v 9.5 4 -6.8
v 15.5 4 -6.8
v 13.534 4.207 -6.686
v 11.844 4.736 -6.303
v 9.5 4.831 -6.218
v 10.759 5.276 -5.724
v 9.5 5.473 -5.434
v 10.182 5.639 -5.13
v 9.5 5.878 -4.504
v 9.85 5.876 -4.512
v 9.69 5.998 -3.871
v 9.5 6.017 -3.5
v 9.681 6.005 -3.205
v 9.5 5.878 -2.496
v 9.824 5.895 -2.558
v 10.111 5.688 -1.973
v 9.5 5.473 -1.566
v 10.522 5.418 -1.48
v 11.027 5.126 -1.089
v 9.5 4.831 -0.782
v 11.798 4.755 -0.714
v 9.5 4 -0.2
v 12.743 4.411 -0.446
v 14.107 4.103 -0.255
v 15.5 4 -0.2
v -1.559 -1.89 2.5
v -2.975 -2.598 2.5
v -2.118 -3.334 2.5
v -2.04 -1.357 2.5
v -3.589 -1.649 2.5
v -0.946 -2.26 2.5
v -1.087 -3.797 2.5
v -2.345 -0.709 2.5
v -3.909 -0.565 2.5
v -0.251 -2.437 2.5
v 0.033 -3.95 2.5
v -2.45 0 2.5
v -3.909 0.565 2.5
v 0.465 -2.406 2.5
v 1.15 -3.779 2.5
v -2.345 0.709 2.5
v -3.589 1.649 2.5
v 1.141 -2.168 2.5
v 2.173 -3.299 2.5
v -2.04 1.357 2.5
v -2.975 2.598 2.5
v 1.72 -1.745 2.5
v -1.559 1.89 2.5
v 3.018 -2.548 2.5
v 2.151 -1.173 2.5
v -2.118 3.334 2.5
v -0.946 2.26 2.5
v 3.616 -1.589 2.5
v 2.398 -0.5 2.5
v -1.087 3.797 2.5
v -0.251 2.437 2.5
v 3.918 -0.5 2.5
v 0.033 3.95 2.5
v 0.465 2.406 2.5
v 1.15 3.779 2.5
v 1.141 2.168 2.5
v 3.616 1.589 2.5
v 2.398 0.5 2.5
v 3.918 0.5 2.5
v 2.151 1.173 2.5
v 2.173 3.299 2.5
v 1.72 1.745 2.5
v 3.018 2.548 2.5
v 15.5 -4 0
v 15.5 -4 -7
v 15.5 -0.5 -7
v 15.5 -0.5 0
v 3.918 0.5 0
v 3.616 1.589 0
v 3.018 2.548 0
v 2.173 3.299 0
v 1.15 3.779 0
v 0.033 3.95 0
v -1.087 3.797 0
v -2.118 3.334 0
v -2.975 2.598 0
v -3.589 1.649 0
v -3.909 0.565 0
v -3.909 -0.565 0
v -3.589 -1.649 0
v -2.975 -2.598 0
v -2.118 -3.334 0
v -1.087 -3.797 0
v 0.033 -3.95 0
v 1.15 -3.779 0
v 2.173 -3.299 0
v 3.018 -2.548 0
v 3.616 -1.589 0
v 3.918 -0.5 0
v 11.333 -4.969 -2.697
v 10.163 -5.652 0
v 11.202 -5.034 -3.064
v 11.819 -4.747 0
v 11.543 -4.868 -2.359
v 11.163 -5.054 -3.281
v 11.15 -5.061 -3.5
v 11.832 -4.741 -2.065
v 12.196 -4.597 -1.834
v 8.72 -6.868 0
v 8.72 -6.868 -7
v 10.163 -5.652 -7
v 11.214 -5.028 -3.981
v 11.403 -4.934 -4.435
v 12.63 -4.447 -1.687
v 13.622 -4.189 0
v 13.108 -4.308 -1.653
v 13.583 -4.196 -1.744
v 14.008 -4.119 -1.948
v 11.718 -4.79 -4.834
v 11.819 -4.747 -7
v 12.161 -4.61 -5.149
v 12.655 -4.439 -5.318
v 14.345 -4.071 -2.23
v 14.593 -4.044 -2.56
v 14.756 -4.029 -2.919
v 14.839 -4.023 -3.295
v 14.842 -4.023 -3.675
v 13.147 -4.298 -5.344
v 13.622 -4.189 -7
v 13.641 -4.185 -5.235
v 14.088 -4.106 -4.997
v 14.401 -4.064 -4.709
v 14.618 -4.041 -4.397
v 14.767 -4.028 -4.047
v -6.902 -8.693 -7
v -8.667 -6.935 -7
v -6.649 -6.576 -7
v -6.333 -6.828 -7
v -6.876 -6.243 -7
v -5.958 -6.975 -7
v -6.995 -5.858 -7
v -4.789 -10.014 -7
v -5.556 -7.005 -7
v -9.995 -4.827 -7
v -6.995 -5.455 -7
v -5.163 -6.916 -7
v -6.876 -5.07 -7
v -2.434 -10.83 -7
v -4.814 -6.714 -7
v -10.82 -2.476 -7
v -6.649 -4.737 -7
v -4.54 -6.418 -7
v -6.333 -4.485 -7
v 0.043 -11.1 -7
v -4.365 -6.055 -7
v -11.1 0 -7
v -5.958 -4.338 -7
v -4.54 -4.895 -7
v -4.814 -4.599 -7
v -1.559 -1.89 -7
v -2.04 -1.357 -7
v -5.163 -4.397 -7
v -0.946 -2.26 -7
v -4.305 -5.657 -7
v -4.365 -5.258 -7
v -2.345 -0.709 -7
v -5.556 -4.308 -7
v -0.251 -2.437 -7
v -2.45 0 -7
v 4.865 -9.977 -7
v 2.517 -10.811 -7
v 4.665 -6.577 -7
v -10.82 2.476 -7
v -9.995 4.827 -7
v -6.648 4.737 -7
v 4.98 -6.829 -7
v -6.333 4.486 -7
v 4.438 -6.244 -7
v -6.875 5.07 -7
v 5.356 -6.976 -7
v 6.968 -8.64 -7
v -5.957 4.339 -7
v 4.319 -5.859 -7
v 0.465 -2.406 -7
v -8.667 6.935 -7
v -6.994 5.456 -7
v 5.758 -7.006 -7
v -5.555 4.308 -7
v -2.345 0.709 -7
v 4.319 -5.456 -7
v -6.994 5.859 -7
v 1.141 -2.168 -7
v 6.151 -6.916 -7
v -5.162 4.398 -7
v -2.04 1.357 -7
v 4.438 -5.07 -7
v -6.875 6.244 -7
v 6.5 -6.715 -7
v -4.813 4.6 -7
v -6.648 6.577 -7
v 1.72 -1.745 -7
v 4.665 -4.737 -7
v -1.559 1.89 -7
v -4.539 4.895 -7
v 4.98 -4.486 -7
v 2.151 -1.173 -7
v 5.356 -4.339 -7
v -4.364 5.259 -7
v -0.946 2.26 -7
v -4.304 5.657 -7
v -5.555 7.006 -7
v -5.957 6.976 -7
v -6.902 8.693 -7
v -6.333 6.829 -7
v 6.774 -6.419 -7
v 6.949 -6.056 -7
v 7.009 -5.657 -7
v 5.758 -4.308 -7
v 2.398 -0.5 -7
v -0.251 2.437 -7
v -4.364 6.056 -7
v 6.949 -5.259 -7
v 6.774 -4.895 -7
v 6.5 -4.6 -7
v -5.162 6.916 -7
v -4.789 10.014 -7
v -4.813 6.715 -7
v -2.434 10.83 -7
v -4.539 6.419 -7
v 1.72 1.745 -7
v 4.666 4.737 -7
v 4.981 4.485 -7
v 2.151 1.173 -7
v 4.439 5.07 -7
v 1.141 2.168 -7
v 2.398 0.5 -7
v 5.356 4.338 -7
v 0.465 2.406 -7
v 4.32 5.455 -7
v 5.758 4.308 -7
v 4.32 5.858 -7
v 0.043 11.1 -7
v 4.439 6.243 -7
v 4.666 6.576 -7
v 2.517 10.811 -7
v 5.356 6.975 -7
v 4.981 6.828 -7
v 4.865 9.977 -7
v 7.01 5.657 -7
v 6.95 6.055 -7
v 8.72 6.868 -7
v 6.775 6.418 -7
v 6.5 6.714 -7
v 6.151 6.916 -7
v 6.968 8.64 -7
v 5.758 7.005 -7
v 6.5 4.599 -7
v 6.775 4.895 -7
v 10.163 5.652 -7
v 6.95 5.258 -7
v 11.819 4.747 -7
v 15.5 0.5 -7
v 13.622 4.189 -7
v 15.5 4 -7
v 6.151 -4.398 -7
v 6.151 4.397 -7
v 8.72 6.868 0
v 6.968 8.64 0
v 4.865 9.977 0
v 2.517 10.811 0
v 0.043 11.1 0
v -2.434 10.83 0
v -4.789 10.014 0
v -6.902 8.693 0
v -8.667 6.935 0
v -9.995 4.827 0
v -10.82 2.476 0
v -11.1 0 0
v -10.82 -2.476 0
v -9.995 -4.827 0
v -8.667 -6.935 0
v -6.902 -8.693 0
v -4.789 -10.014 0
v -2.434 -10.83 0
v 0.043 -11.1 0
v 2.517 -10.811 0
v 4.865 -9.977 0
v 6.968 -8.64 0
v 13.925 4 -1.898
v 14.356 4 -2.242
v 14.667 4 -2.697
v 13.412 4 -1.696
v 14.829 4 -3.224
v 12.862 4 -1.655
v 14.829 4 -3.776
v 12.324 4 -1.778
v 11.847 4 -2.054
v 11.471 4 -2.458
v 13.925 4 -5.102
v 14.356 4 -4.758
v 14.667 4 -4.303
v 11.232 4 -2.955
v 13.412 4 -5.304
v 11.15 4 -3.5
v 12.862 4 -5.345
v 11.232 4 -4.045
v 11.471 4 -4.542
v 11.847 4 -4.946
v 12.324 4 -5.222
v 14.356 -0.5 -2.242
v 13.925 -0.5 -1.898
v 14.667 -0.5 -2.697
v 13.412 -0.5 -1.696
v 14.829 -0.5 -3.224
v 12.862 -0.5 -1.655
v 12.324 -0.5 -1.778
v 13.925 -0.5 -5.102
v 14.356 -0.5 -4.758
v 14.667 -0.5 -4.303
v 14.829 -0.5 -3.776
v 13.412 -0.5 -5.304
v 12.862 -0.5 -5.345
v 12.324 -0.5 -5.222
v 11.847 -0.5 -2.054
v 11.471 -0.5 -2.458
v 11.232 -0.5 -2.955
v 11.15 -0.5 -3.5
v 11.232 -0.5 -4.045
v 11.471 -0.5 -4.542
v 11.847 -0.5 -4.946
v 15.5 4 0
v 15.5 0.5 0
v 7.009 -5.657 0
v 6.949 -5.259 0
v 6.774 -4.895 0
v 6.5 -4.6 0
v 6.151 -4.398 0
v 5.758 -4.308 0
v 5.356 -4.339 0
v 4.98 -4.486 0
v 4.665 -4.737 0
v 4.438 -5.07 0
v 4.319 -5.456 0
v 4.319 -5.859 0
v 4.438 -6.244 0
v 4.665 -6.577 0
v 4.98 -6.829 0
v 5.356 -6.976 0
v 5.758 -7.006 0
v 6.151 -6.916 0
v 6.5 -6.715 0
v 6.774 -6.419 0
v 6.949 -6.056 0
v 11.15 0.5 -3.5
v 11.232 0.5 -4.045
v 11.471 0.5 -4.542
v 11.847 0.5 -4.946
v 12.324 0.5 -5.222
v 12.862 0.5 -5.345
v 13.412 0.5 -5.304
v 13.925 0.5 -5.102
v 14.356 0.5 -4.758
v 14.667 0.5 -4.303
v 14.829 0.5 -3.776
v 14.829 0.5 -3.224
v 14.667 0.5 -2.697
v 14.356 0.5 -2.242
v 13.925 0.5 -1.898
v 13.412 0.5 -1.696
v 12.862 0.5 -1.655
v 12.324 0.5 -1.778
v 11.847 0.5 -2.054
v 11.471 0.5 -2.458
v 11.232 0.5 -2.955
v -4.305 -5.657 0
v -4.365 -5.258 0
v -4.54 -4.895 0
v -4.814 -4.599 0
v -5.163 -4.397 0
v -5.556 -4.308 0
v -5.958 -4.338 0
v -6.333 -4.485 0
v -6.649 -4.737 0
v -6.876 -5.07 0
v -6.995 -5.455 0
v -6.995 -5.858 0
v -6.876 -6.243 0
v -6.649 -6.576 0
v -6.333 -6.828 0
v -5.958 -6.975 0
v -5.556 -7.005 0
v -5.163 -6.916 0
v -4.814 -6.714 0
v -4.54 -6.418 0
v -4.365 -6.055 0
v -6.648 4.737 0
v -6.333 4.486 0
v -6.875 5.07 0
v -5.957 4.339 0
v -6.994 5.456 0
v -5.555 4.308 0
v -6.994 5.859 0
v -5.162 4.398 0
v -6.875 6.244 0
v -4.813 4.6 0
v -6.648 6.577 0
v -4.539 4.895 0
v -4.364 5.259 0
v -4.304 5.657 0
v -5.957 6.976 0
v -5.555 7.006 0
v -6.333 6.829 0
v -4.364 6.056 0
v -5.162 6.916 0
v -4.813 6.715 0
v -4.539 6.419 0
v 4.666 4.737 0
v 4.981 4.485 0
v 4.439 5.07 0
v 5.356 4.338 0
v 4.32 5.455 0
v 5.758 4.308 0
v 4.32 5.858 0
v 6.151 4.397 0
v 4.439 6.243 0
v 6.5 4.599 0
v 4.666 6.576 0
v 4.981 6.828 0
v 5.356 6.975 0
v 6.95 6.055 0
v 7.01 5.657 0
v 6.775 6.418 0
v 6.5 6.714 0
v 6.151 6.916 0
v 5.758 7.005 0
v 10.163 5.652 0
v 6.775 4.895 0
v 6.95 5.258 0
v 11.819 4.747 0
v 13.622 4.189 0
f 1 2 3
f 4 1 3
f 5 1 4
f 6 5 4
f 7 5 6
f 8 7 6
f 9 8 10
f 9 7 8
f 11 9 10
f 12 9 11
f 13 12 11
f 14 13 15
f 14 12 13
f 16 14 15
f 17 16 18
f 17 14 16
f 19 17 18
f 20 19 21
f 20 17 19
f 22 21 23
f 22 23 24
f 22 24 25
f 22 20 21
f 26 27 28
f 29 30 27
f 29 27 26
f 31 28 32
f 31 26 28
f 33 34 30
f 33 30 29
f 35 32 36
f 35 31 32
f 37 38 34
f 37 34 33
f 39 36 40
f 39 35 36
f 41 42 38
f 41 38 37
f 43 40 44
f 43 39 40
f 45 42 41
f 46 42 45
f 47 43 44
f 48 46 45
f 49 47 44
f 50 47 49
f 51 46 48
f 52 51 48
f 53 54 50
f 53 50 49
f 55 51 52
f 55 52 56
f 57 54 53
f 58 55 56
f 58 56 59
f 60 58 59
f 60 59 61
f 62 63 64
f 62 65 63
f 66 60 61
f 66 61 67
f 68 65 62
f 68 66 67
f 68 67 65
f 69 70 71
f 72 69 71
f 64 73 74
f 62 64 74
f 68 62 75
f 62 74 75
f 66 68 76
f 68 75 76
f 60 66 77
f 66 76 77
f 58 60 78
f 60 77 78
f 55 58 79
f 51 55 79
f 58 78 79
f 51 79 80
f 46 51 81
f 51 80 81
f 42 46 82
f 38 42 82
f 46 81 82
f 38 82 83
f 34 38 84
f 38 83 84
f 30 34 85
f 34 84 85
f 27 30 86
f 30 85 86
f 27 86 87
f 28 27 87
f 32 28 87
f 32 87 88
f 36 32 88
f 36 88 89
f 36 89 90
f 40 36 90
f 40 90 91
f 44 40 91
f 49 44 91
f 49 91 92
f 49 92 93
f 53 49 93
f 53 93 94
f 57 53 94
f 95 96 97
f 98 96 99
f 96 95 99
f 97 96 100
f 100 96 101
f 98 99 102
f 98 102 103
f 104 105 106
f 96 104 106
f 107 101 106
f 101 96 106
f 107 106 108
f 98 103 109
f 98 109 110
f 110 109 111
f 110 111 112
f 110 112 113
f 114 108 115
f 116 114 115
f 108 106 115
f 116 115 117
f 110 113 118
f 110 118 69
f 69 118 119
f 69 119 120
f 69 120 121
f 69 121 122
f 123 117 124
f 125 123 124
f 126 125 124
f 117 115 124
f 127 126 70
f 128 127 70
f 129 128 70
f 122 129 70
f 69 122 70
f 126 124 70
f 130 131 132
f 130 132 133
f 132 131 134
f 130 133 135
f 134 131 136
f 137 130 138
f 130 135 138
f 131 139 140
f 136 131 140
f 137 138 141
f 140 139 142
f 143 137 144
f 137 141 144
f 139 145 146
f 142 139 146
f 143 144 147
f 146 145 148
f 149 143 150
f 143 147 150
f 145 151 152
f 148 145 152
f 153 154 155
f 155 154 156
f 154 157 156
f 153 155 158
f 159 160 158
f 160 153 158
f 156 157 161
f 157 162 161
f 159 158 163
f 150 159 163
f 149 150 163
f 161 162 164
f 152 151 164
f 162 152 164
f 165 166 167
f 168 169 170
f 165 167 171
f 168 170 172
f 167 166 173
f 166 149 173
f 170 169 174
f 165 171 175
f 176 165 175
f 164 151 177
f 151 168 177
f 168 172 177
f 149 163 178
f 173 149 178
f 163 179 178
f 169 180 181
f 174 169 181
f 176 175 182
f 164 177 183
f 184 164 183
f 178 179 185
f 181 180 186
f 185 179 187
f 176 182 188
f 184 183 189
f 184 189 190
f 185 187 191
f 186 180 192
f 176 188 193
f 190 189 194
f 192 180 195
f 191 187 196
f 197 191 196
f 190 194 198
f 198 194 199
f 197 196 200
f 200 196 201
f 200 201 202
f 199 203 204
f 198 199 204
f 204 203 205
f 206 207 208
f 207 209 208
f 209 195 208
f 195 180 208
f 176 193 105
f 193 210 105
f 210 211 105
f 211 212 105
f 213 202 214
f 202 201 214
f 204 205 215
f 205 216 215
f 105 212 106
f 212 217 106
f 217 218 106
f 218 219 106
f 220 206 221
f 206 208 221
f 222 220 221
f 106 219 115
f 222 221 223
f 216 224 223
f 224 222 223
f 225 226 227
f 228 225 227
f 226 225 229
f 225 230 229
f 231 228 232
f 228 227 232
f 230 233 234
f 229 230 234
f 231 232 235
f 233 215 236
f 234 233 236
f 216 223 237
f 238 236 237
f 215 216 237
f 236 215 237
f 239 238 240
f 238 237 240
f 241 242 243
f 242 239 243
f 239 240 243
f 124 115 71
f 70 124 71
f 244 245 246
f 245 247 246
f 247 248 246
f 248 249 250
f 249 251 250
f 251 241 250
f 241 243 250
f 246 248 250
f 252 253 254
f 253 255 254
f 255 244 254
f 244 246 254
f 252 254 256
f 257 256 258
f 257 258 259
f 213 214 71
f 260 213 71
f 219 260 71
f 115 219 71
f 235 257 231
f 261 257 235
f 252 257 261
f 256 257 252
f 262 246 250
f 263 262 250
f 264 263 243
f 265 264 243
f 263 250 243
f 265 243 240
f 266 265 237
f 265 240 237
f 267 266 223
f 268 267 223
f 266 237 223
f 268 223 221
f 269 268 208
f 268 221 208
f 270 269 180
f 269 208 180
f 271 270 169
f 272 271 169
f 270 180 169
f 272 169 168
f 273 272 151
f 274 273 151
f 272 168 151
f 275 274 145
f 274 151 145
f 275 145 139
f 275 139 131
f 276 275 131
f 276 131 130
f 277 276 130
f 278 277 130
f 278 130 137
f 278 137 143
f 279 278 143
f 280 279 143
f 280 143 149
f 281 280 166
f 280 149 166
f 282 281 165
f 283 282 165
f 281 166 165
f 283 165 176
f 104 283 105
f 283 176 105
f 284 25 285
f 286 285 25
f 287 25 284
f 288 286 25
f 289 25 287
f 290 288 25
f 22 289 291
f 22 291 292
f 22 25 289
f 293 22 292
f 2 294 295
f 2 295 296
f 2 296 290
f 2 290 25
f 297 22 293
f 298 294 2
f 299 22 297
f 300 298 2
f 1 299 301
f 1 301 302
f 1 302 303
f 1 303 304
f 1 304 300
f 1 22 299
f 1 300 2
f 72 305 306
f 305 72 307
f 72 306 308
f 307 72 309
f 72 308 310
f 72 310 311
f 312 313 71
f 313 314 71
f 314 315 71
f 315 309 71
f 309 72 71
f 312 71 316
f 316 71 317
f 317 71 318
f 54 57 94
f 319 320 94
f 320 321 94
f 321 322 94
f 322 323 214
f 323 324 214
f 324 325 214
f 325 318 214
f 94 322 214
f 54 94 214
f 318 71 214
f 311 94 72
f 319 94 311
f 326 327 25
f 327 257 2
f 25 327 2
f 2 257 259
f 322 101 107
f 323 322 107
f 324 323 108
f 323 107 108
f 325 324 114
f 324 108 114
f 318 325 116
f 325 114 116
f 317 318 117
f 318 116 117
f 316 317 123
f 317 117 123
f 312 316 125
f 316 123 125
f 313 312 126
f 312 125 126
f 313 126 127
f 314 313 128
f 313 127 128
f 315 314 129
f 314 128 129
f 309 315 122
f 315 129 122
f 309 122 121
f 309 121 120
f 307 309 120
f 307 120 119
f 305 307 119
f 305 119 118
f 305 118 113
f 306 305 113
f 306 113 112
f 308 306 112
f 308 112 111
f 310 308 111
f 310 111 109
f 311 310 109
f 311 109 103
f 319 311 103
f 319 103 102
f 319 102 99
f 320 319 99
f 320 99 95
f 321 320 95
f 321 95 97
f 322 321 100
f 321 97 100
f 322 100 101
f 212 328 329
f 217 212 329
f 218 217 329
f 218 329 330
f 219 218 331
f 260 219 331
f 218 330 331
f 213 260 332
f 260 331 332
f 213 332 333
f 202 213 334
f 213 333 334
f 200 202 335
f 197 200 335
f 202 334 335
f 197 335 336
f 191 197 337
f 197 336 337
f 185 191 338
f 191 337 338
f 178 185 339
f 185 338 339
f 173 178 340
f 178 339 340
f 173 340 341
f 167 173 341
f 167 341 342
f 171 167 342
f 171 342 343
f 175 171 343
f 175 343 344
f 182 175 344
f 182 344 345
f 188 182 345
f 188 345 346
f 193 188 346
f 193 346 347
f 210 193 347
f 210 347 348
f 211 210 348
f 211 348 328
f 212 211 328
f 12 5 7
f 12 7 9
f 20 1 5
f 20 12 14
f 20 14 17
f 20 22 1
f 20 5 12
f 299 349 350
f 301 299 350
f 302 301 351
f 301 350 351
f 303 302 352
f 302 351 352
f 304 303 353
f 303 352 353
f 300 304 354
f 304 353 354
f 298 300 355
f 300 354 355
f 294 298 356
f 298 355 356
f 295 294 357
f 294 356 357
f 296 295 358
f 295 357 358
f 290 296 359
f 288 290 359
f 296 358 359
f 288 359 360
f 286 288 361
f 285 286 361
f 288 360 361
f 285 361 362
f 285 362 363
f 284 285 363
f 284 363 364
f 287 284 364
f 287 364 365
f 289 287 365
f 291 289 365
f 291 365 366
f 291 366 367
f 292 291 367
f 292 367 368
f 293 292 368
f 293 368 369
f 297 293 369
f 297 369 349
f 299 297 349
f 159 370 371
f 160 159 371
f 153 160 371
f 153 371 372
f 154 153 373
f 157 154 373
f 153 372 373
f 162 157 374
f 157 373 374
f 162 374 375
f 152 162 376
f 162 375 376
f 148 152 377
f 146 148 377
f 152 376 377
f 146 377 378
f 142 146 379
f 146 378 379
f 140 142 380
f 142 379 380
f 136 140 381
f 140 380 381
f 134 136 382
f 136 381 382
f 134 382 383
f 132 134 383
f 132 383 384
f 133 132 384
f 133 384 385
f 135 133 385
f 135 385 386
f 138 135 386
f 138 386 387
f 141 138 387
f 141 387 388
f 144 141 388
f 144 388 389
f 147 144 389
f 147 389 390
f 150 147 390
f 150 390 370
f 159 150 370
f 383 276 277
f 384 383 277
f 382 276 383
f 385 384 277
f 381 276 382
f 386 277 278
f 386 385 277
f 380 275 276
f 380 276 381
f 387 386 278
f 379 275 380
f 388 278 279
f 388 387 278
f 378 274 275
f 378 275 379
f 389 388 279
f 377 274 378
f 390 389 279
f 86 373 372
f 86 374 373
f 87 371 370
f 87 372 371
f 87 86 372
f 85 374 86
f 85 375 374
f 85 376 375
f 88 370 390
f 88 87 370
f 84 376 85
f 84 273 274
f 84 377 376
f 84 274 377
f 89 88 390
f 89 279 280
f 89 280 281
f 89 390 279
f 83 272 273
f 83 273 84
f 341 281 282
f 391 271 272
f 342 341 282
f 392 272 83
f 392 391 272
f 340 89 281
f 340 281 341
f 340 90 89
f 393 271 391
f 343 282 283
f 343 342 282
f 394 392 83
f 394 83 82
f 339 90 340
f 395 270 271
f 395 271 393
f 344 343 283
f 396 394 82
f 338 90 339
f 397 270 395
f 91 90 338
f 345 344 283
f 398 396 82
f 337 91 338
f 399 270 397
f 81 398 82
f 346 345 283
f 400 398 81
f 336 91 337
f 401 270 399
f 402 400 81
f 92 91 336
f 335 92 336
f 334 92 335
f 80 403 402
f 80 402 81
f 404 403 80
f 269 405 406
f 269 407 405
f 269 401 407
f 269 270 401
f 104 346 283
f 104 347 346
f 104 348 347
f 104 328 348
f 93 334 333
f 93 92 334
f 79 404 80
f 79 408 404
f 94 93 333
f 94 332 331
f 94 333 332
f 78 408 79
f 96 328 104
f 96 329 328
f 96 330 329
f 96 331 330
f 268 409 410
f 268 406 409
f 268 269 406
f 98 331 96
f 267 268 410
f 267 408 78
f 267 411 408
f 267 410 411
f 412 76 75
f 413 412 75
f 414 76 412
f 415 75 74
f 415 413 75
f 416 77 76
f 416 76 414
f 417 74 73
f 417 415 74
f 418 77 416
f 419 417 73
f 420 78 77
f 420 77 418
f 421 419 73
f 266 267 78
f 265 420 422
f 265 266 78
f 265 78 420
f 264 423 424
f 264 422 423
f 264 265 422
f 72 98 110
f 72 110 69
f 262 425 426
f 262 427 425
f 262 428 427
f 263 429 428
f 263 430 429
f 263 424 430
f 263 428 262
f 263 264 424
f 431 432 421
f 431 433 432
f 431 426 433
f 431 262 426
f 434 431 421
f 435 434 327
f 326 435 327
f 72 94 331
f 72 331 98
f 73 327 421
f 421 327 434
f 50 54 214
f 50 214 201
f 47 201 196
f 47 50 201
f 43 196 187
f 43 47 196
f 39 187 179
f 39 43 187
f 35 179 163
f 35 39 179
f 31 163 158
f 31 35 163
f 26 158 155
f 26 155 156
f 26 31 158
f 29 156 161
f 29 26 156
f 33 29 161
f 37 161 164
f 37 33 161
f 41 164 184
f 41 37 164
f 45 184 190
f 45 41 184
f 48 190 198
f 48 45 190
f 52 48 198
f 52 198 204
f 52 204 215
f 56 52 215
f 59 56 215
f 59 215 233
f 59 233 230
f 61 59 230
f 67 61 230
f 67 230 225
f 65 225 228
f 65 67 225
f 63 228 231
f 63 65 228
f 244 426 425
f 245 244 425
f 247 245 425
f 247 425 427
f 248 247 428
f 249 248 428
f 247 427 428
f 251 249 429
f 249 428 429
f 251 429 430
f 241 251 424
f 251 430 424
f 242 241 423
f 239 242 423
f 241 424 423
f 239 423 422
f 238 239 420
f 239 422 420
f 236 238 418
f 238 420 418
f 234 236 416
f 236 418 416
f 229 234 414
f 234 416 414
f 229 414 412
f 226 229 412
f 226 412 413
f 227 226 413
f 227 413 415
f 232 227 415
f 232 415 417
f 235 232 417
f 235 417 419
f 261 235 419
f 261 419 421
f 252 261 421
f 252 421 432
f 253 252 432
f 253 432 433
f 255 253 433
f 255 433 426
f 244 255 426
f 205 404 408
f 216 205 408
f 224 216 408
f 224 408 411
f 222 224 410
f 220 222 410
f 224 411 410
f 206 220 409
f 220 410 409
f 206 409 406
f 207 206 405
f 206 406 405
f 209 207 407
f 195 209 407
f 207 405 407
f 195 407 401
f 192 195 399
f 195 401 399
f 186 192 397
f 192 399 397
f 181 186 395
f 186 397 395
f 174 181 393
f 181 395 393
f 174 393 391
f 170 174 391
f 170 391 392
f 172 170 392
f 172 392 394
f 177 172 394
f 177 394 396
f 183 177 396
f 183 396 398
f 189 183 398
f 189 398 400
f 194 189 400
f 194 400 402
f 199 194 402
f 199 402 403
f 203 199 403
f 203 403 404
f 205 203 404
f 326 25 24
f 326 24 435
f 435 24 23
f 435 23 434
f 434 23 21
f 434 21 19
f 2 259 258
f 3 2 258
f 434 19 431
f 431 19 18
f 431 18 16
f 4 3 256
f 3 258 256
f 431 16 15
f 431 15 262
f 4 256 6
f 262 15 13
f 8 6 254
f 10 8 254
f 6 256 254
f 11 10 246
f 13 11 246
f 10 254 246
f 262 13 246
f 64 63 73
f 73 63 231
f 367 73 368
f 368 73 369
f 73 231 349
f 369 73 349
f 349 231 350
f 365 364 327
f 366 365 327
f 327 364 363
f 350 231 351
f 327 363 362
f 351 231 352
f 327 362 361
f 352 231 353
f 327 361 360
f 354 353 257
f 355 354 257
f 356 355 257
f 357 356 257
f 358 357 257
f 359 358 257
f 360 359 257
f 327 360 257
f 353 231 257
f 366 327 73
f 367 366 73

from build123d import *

# Parameters (mm, degrees)
CUT_EXTRUDE1_START             = -0.2
CUT_EXTRUDE1_DEPTH             = 0.2
CUT_EXTRUDE1_START_2           = -7
CUT_EXTRUDE1_2_DEPTH           = 0.1999999
CUT_EXTRUDE1_START_3           = -6.8000001
CUT_EXTRUDE1_3_DEPTH           = 6.6000001
CUT_EXTRUDE1_START_4           = 9.5
CUT_EXTRUDE1_4_DEPTH           = 6.5
SKETCH2_R                      = 3.95
BOSS_EXTRUDE1_DEPTH            = 2.5
CUT_EXTRUDE2_DEPTH             = 22.300469551
SKETCH4_W                      = 2.45
SKETCH4_H                      = 9.5
M2_5_CLEARANCE_HOLE1_D         = 2.7051
M2_5_CLEARANCE_HOLE1_DEPTH     = 9.5
SKETCH7_W                      = 1.35255
SKETCH7_H                      = 10.6
F_3_7_3_7_DIAMETER_HOLE1_D     = 3.7
F_3_7_3_7_DIAMETER_HOLE1_DEPTH = 15.1


with BuildPart() as part:
    # Cut-Extrude1: read off the stored shape, not the designer's step
    # Cut-Extrude1 outline → Cut-Extrude1 (new body)
    with BuildSketch(Plane.XY.offset(CUT_EXTRUDE1_START)):
        with BuildLine():
            ThreePointArc((8.719864541, -6.868330393), (11.819050527, -4.746581358), (15.5, -4))
            Line((15.5, -4), (15.5, 4))
            ThreePointArc((15.5, 4), (11.819050527, 4.746581358), (8.719864541, 6.868330393))
            ThreePointArc((8.719864541, 6.868330393), (-11.1, 0), (8.719864541, -6.868330393))
        make_face()
    extrude(amount=CUT_EXTRUDE1_DEPTH)



with BuildPart() as body_2:
    # Cut-Extrude1 2 outline → Cut-Extrude1 2 (new body)
    with BuildSketch(Plane.XY.offset(CUT_EXTRUDE1_START_2)):
        with BuildLine():
            ThreePointArc((8.719864541, -6.868330393), (11.819050527, -4.746581358), (15.5, -4))
            Line((15.5, -4), (15.5, 4))
            ThreePointArc((15.5, 4), (11.819050527, 4.746581358), (8.719864541, 6.868330393))
            ThreePointArc((8.719864541, 6.868330393), (-11.1, 0), (8.719864541, -6.868330393))
        make_face()
    extrude(amount=CUT_EXTRUDE1_2_DEPTH)


with BuildPart() as part_1:
    add(part.part)

    add(body_2.part)  # Cut-Extrude1 3 merges body 2
    # Cut-Extrude1 3 outline → Cut-Extrude1 3 (add)
    with BuildSketch(Plane.XY.offset(CUT_EXTRUDE1_START_3)):
        with BuildLine():
            ThreePointArc((8.719864541, -6.868330393), (11.819050527, -4.746581358), (15.5, -4))
            Line((15.5, -4), (15.5, 4))
            ThreePointArc((15.5, 4), (11.819050527, 4.746581358), (8.719864541, 6.868330393))
            ThreePointArc((8.719864541, 6.868330393), (-11.1, 0), (8.719864541, -6.868330393))
        make_face()
    extrude(amount=CUT_EXTRUDE1_3_DEPTH)

    # Cut-Extrude1 4 outline → Cut-Extrude1 4 (cut)
    with BuildSketch(Plane.YZ.offset(CUT_EXTRUDE1_START_4)):
        with BuildLine():
            ThreePointArc((4, -6.8), (6.016591059, -3.5), (4, -0.2))
            Line((4, -0.2), (4, -6.8))
        make_face()
    extrude(amount=CUT_EXTRUDE1_4_DEPTH, mode=Mode.SUBTRACT)

    # Sketch2 → Boss-Extrude1 (add)
    with BuildSketch(Plane.XY):
        Circle(SKETCH2_R)
    extrude(amount=BOSS_EXTRUDE1_DEPTH)

    # Sketch3 → Cut-Extrude2 (cut, through all)
    with BuildSketch(Plane(origin=(0, 0, -7), x_dir=(-1, 0, 0), z_dir=(0, 0, -1))):
        with BuildLine():
            Line((-15.5, 0.5), (-15.5, -0.5))
            Line((-15.5, -0.5), (-2.398436991, -0.5))
            ThreePointArc((-2.398436991, -0.5), (-2.45, 0), (-2.398436991, 0.5))
            Line((-2.398436991, 0.5), (-15.5, 0.5))
        make_face()
    extrude(amount=-CUT_EXTRUDE2_DEPTH, mode=Mode.SUBTRACT)

    # Sketch4 → Cut-Revolve1 (revolve, cut)
    with BuildSketch(Plane.XZ):
        with Locations((1.225, -2.25)):
            Rectangle(SKETCH4_W, SKETCH4_H)
    revolve(axis=Axis((0, 0, 2.5), (0, 0, -1)), mode=Mode.SUBTRACT)

    # M2.5 Clearance Hole1
    with Locations(Plane(origin=(0, 0, -7), x_dir=(-1, 0, 0), z_dir=(0, 0, -1))):
        with Locations((5.656516225, 5.657192254), (-5.657192254, 5.656516225), (-5.656516225, -5.657192254), (5.657192254, -5.656516225)):
            Hole(M2_5_CLEARANCE_HOLE1_D / 2, depth=M2_5_CLEARANCE_HOLE1_DEPTH)

    # Sketch7 → M2.5 Clearance Hole2 (revolve, cut)
    with BuildSketch(Plane(origin=(13, -0.5, -3.5), x_dir=(0, 0, 1), z_dir=(1, 0, 0))):
        with Locations((0.676275, 5.3)):
            Rectangle(SKETCH7_W, SKETCH7_H)
    revolve(axis=Axis((13, 5.85, -3.5), (0, -1, 0)), mode=Mode.SUBTRACT)

    # Ø3.7 (3.7) Diameter Hole1
    with Locations(Plane(origin=(0, 4, 0), x_dir=(1, 0, 0), z_dir=(0, 1, 0))):
        with Locations((13, 3.5)):
            Hole(F_3_7_3_7_DIAMETER_HOLE1_D / 2, depth=F_3_7_3_7_DIAMETER_HOLE1_DEPTH)


solid = part_1.part
